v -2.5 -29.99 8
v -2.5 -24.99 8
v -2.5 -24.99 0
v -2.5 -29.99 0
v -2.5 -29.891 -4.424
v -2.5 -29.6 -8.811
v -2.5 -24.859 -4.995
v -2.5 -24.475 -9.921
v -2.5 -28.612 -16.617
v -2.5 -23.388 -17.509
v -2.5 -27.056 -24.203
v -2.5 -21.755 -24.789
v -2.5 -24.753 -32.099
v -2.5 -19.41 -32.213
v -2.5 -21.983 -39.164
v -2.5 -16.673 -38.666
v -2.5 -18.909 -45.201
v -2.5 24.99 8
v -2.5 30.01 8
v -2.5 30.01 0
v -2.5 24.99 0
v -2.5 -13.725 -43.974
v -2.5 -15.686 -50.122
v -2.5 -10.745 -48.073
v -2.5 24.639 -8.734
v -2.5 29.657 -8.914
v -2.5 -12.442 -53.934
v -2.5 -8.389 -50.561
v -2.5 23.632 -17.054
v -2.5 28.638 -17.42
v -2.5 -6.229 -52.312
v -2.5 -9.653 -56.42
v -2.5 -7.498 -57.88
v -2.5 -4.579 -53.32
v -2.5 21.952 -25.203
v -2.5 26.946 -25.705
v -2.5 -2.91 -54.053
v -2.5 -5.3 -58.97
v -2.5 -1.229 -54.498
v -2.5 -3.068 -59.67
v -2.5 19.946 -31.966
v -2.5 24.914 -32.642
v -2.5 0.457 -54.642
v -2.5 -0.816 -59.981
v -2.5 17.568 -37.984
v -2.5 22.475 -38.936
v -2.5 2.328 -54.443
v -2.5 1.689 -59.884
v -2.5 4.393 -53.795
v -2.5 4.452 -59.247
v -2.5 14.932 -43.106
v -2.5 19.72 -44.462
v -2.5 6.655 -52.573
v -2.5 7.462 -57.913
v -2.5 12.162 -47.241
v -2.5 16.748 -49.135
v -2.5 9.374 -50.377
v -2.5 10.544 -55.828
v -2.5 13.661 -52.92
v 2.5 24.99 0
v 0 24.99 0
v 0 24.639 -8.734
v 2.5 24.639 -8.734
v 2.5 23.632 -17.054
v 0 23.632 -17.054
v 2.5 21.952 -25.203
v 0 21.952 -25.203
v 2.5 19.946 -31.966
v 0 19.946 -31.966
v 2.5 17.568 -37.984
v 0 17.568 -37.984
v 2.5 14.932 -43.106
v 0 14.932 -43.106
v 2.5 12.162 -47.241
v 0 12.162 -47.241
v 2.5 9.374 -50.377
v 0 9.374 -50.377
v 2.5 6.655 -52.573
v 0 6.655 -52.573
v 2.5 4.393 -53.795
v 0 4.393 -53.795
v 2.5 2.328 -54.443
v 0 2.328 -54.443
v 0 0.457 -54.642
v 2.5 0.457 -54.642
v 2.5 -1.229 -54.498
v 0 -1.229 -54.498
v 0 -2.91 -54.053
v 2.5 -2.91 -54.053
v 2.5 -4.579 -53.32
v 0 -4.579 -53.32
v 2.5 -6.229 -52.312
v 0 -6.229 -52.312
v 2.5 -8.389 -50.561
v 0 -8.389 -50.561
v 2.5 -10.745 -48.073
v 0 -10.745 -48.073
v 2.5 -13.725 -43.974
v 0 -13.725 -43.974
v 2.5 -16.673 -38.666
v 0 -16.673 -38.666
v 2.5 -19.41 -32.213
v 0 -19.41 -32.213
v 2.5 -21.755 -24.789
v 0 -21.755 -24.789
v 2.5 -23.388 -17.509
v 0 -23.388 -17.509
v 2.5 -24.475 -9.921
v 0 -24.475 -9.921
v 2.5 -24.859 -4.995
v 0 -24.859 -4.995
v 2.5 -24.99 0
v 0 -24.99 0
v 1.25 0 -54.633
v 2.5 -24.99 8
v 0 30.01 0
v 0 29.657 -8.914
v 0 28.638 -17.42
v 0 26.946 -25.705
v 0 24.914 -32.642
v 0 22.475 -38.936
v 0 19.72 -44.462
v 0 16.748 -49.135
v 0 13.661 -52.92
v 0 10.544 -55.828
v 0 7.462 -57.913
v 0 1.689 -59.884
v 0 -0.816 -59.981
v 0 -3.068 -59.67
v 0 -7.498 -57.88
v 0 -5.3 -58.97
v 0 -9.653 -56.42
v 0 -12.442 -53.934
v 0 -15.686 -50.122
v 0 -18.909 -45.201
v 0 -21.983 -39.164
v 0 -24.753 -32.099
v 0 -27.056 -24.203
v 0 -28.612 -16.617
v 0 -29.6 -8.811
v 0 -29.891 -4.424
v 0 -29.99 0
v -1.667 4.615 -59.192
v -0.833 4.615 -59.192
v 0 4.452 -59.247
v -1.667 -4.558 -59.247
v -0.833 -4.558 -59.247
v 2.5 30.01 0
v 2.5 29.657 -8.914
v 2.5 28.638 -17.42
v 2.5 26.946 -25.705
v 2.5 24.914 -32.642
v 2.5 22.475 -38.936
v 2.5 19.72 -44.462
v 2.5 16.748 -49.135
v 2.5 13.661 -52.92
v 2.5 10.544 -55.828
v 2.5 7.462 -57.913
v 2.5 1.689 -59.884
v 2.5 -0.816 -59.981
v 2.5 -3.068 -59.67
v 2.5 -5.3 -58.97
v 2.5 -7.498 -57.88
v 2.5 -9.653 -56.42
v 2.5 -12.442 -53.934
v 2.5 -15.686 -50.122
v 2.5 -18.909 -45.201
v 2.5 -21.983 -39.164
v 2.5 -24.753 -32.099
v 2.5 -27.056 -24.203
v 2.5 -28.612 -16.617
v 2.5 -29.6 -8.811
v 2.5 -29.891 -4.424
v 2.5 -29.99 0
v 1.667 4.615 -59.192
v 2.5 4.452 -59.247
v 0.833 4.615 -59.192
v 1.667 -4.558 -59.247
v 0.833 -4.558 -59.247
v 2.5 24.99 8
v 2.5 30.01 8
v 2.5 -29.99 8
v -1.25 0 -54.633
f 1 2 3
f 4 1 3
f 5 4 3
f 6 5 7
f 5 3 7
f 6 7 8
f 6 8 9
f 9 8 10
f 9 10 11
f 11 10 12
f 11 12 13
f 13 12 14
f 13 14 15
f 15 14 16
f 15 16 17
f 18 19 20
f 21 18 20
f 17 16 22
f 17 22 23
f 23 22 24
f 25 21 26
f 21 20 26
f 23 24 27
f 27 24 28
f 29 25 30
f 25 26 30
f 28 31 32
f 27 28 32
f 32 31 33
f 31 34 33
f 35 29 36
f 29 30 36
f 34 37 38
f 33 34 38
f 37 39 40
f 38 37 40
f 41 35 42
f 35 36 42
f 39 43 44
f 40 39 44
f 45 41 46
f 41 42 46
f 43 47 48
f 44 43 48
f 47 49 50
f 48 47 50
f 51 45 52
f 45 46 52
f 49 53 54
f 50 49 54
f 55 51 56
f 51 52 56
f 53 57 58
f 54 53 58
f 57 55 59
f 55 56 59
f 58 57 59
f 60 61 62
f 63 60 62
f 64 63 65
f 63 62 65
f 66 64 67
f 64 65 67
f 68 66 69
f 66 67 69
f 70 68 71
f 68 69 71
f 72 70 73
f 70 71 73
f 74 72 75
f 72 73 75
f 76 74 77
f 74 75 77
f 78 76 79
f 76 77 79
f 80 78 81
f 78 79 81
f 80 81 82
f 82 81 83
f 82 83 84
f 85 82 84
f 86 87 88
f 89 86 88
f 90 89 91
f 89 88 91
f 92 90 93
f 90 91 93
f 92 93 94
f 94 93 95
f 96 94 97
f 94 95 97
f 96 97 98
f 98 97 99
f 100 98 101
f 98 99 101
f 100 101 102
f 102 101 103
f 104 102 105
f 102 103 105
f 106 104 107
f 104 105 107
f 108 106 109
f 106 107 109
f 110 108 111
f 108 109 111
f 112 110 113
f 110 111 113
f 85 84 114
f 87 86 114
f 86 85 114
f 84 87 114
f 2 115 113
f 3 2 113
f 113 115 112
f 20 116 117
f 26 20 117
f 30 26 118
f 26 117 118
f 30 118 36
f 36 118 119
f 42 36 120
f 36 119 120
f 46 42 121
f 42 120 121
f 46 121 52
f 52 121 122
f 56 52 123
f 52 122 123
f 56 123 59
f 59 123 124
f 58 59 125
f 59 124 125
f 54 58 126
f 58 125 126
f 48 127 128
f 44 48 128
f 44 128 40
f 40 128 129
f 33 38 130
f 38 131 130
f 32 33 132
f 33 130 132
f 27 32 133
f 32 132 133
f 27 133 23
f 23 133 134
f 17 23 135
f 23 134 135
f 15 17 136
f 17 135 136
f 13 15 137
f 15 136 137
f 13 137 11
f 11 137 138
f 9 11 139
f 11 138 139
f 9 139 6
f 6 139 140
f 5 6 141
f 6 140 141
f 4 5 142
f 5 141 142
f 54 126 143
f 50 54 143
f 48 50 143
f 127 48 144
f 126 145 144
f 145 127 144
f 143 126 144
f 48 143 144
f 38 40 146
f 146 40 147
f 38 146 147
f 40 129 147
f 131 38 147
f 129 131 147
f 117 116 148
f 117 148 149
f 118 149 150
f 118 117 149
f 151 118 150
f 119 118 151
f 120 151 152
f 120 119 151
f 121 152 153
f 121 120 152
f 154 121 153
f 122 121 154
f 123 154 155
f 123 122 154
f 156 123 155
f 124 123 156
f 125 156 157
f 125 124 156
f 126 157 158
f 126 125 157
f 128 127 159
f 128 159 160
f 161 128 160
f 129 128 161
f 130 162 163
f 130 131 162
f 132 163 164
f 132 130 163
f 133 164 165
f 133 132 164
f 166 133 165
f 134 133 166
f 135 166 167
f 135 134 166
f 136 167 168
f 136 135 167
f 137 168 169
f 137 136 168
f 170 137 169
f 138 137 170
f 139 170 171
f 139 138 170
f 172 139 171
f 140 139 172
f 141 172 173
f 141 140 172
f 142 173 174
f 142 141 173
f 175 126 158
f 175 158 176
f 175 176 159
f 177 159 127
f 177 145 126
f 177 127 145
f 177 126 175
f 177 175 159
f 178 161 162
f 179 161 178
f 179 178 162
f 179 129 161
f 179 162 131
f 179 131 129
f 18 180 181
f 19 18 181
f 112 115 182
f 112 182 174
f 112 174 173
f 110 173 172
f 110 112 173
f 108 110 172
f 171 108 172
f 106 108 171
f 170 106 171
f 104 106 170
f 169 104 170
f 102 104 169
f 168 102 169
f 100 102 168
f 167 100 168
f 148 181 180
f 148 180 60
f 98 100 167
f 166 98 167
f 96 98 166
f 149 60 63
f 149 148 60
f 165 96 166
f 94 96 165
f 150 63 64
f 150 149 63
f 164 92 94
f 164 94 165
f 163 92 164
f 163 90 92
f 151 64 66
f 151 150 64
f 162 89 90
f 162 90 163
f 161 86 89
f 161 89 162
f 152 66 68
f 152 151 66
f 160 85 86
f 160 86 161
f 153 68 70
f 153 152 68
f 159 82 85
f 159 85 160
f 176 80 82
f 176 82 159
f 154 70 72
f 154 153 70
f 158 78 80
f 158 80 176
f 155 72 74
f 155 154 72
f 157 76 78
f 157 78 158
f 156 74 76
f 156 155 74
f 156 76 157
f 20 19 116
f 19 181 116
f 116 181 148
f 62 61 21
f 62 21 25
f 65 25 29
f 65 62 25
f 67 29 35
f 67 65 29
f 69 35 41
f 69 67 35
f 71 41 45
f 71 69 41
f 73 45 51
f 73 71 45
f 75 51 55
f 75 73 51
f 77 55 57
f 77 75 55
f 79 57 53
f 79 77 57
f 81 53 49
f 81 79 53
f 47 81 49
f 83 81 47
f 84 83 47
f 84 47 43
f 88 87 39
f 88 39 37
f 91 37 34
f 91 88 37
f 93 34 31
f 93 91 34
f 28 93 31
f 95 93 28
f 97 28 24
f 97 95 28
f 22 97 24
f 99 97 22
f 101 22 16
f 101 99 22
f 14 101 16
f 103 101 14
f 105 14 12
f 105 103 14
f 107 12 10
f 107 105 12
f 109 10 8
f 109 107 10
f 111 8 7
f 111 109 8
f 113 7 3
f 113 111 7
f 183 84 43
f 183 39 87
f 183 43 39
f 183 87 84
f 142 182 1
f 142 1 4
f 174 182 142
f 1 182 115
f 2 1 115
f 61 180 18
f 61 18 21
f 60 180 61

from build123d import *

# Parameters (mm, degrees)
SKETCH1_W           = 8
SKETCH1_H           = 5.019775672
SKETCH1_H_2         = 5.000079272
BOSS_EXTRUDE1_DEPTH = 2.5


with BuildPart() as part:
    # Sketch1 → Boss-Extrude1 (new, symmetric)
    with BuildSketch(Plane(origin=(0, 0, 0), x_dir=(0, 0, -1), z_dir=(1, 0, 0))):
        with Locations((-4, 27.499960364)):
            Rectangle(SKETCH1_W, SKETCH1_H)
        with BuildLine():
            add(Edge.make_bspline(
                [(0, 30.0098482), (29.777837141, 30.0098482), (59.944698768, 15.724870112), (60.57082784, -15.453928663), (27.842412116, -29.9901518), (0, -29.9901518)],
                knots=[0, 0, 0, 0, 0.453231819, 0.553231819, 1, 1, 1, 1], degree=3))
            Line((0, 30.0098482), (0, 24.990072528))
            add(Edge.make_bspline(
                [(0, 24.990072528), (30.140729333, 24.990072528), (80.214114902, 0), (27.96337618, -24.990072528), (0, -24.990072528)],
                knots=[0, 0, 0, 0, 0.5, 1, 1, 1, 1], degree=3))
            Line((0, -24.990072528), (0, -29.9901518))
        make_face()
        with Locations((-4, -27.490112164)):
            Rectangle(SKETCH1_W, SKETCH1_H_2)
    extrude(amount=BOSS_EXTRUDE1_DEPTH, both=True)


solid = part.part
